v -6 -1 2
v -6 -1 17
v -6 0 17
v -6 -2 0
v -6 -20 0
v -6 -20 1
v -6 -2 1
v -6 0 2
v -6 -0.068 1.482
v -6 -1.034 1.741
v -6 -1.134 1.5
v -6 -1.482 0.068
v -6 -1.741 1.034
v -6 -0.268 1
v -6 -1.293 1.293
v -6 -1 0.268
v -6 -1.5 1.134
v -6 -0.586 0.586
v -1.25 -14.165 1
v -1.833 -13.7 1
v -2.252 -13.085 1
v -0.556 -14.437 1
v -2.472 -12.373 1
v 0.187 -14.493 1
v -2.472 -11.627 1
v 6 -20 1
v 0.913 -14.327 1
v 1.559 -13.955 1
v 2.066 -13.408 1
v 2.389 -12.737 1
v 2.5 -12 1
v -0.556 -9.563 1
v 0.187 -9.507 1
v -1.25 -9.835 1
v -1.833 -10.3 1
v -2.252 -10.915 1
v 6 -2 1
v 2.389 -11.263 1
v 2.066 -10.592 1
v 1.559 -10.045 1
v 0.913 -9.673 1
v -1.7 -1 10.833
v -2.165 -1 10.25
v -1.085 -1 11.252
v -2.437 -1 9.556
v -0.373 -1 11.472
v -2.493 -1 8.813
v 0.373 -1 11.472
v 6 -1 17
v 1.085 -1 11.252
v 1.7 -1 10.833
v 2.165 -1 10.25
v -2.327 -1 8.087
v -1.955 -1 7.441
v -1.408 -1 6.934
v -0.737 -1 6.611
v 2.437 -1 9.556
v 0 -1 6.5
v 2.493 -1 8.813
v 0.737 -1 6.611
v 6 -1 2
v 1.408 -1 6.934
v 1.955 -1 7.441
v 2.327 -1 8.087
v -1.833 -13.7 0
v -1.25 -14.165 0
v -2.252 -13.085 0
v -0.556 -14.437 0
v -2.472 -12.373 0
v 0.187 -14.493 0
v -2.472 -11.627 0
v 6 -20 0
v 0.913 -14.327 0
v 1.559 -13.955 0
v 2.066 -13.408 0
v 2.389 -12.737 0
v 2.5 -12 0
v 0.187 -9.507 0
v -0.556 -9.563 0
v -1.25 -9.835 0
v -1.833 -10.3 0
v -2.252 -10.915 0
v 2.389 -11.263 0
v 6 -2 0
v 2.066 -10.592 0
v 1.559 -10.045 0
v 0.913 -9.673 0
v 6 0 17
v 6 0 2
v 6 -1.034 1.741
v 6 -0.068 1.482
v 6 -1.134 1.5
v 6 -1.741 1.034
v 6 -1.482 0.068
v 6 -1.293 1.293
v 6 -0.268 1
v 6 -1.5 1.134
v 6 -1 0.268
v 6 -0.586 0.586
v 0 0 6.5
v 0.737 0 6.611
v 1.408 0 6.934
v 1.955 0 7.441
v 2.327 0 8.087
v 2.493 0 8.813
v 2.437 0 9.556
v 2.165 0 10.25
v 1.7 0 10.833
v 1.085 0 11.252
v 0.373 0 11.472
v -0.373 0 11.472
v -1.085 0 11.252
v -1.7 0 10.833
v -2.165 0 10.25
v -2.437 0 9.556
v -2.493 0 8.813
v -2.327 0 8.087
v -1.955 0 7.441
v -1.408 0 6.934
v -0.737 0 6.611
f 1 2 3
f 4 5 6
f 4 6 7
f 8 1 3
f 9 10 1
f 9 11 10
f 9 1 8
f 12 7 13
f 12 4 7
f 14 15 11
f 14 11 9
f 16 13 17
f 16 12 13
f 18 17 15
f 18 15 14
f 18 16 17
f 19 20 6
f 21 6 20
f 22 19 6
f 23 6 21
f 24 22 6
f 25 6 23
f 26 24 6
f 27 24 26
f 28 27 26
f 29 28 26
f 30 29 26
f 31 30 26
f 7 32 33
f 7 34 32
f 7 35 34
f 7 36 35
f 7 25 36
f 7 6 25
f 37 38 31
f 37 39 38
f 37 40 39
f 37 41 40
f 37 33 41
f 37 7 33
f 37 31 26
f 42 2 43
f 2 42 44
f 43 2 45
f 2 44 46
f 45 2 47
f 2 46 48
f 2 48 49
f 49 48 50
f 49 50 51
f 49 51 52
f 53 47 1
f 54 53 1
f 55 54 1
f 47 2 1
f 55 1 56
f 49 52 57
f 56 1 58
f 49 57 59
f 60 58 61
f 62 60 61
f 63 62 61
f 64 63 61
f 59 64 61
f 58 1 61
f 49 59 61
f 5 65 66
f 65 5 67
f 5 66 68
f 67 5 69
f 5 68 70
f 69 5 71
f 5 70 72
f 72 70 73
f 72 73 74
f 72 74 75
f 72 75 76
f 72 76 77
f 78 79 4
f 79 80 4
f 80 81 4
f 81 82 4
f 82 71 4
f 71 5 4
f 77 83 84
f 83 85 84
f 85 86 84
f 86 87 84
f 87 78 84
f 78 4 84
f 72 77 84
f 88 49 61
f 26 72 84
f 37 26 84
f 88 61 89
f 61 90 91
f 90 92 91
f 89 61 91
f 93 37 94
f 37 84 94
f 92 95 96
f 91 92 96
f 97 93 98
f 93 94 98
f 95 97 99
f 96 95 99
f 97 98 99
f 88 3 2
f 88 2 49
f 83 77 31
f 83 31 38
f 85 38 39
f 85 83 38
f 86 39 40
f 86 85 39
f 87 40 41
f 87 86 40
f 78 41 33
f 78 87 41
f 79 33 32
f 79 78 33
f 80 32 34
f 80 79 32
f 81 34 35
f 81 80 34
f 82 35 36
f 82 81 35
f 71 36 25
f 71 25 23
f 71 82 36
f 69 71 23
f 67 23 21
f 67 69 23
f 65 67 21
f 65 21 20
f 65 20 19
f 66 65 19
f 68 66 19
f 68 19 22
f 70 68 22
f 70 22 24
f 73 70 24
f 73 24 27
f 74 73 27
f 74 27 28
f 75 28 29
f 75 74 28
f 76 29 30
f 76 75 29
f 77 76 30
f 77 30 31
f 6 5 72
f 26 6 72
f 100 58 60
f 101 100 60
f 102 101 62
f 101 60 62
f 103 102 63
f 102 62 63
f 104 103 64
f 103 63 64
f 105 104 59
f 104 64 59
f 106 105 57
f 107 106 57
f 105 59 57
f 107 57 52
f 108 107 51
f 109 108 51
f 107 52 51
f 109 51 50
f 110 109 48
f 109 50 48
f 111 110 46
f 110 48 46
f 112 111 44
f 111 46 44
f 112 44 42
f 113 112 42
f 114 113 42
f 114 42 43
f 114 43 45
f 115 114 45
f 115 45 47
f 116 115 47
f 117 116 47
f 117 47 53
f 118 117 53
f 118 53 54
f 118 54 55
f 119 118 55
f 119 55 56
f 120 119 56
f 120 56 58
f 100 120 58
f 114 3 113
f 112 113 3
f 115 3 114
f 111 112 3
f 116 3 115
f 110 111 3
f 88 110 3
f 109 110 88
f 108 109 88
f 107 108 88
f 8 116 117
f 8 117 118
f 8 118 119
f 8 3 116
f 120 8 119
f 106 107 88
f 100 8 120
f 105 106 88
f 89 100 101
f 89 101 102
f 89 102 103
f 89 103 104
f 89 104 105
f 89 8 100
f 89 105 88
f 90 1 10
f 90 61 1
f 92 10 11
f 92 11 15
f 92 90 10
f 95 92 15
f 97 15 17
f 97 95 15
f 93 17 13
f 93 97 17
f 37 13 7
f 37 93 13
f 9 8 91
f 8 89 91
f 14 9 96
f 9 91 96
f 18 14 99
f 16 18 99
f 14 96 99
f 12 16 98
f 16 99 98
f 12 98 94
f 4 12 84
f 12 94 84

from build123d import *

# Parameters (mm, degrees)
CROQUIS1_W              = 12
CROQUIS1_H              = 20
CROQUIS1_R              = 2.5
SALIENTE_EXTRUIR1_DEPTH = 1
CROQUIS2_W              = 12
CROQUIS2_H              = 1
SALIENTE_EXTRUIR2_DEPTH = 16
CROQUIS3_R              = 2.5
CORTAR_EXTRUIR1_DEPTH   = 8
REDONDEO2_R             = 1
REDONDEO3_R             = 2


with BuildPart() as part:
    # Croquis1 → Saliente-Extruir1 (new body)
    with BuildSketch(Plane.XY):
        with Locations((0, -10)):
            Rectangle(CROQUIS1_W, CROQUIS1_H)
        with Locations((0, -12)):
            Circle(CROQUIS1_R, mode=Mode.SUBTRACT)
    extrude(amount=SALIENTE_EXTRUIR1_DEPTH)

    # Croquis2 → Saliente-Extruir2 (add)
    with BuildSketch(Plane.XY.offset(1)):
        with Locations((0, -0.5)):
            Rectangle(CROQUIS2_W, CROQUIS2_H)
    extrude(amount=SALIENTE_EXTRUIR2_DEPTH)

    # Croquis3 → Cortar-Extruir1 (cut)
    with BuildSketch(Plane.XZ.offset(1)):
        with Locations(Location((0, 9, 0), (0, 0, 270))):
            Circle(CROQUIS3_R)
    extrude(amount=-CORTAR_EXTRUIR1_DEPTH, mode=Mode.SUBTRACT)

    # Redondeo2
    redondeo2_edges = [part.edges().sort_by_distance(p)[0] for p in [
        (0, -1, 1),
    ]]
    fillet(redondeo2_edges, radius=REDONDEO2_R)

    # Redondeo3
    redondeo3_edges = [part.edges().sort_by_distance(p)[0] for p in [
        (0, 0, 0),
    ]]
    fillet(redondeo3_edges, radius=REDONDEO3_R)


solid = part.part
